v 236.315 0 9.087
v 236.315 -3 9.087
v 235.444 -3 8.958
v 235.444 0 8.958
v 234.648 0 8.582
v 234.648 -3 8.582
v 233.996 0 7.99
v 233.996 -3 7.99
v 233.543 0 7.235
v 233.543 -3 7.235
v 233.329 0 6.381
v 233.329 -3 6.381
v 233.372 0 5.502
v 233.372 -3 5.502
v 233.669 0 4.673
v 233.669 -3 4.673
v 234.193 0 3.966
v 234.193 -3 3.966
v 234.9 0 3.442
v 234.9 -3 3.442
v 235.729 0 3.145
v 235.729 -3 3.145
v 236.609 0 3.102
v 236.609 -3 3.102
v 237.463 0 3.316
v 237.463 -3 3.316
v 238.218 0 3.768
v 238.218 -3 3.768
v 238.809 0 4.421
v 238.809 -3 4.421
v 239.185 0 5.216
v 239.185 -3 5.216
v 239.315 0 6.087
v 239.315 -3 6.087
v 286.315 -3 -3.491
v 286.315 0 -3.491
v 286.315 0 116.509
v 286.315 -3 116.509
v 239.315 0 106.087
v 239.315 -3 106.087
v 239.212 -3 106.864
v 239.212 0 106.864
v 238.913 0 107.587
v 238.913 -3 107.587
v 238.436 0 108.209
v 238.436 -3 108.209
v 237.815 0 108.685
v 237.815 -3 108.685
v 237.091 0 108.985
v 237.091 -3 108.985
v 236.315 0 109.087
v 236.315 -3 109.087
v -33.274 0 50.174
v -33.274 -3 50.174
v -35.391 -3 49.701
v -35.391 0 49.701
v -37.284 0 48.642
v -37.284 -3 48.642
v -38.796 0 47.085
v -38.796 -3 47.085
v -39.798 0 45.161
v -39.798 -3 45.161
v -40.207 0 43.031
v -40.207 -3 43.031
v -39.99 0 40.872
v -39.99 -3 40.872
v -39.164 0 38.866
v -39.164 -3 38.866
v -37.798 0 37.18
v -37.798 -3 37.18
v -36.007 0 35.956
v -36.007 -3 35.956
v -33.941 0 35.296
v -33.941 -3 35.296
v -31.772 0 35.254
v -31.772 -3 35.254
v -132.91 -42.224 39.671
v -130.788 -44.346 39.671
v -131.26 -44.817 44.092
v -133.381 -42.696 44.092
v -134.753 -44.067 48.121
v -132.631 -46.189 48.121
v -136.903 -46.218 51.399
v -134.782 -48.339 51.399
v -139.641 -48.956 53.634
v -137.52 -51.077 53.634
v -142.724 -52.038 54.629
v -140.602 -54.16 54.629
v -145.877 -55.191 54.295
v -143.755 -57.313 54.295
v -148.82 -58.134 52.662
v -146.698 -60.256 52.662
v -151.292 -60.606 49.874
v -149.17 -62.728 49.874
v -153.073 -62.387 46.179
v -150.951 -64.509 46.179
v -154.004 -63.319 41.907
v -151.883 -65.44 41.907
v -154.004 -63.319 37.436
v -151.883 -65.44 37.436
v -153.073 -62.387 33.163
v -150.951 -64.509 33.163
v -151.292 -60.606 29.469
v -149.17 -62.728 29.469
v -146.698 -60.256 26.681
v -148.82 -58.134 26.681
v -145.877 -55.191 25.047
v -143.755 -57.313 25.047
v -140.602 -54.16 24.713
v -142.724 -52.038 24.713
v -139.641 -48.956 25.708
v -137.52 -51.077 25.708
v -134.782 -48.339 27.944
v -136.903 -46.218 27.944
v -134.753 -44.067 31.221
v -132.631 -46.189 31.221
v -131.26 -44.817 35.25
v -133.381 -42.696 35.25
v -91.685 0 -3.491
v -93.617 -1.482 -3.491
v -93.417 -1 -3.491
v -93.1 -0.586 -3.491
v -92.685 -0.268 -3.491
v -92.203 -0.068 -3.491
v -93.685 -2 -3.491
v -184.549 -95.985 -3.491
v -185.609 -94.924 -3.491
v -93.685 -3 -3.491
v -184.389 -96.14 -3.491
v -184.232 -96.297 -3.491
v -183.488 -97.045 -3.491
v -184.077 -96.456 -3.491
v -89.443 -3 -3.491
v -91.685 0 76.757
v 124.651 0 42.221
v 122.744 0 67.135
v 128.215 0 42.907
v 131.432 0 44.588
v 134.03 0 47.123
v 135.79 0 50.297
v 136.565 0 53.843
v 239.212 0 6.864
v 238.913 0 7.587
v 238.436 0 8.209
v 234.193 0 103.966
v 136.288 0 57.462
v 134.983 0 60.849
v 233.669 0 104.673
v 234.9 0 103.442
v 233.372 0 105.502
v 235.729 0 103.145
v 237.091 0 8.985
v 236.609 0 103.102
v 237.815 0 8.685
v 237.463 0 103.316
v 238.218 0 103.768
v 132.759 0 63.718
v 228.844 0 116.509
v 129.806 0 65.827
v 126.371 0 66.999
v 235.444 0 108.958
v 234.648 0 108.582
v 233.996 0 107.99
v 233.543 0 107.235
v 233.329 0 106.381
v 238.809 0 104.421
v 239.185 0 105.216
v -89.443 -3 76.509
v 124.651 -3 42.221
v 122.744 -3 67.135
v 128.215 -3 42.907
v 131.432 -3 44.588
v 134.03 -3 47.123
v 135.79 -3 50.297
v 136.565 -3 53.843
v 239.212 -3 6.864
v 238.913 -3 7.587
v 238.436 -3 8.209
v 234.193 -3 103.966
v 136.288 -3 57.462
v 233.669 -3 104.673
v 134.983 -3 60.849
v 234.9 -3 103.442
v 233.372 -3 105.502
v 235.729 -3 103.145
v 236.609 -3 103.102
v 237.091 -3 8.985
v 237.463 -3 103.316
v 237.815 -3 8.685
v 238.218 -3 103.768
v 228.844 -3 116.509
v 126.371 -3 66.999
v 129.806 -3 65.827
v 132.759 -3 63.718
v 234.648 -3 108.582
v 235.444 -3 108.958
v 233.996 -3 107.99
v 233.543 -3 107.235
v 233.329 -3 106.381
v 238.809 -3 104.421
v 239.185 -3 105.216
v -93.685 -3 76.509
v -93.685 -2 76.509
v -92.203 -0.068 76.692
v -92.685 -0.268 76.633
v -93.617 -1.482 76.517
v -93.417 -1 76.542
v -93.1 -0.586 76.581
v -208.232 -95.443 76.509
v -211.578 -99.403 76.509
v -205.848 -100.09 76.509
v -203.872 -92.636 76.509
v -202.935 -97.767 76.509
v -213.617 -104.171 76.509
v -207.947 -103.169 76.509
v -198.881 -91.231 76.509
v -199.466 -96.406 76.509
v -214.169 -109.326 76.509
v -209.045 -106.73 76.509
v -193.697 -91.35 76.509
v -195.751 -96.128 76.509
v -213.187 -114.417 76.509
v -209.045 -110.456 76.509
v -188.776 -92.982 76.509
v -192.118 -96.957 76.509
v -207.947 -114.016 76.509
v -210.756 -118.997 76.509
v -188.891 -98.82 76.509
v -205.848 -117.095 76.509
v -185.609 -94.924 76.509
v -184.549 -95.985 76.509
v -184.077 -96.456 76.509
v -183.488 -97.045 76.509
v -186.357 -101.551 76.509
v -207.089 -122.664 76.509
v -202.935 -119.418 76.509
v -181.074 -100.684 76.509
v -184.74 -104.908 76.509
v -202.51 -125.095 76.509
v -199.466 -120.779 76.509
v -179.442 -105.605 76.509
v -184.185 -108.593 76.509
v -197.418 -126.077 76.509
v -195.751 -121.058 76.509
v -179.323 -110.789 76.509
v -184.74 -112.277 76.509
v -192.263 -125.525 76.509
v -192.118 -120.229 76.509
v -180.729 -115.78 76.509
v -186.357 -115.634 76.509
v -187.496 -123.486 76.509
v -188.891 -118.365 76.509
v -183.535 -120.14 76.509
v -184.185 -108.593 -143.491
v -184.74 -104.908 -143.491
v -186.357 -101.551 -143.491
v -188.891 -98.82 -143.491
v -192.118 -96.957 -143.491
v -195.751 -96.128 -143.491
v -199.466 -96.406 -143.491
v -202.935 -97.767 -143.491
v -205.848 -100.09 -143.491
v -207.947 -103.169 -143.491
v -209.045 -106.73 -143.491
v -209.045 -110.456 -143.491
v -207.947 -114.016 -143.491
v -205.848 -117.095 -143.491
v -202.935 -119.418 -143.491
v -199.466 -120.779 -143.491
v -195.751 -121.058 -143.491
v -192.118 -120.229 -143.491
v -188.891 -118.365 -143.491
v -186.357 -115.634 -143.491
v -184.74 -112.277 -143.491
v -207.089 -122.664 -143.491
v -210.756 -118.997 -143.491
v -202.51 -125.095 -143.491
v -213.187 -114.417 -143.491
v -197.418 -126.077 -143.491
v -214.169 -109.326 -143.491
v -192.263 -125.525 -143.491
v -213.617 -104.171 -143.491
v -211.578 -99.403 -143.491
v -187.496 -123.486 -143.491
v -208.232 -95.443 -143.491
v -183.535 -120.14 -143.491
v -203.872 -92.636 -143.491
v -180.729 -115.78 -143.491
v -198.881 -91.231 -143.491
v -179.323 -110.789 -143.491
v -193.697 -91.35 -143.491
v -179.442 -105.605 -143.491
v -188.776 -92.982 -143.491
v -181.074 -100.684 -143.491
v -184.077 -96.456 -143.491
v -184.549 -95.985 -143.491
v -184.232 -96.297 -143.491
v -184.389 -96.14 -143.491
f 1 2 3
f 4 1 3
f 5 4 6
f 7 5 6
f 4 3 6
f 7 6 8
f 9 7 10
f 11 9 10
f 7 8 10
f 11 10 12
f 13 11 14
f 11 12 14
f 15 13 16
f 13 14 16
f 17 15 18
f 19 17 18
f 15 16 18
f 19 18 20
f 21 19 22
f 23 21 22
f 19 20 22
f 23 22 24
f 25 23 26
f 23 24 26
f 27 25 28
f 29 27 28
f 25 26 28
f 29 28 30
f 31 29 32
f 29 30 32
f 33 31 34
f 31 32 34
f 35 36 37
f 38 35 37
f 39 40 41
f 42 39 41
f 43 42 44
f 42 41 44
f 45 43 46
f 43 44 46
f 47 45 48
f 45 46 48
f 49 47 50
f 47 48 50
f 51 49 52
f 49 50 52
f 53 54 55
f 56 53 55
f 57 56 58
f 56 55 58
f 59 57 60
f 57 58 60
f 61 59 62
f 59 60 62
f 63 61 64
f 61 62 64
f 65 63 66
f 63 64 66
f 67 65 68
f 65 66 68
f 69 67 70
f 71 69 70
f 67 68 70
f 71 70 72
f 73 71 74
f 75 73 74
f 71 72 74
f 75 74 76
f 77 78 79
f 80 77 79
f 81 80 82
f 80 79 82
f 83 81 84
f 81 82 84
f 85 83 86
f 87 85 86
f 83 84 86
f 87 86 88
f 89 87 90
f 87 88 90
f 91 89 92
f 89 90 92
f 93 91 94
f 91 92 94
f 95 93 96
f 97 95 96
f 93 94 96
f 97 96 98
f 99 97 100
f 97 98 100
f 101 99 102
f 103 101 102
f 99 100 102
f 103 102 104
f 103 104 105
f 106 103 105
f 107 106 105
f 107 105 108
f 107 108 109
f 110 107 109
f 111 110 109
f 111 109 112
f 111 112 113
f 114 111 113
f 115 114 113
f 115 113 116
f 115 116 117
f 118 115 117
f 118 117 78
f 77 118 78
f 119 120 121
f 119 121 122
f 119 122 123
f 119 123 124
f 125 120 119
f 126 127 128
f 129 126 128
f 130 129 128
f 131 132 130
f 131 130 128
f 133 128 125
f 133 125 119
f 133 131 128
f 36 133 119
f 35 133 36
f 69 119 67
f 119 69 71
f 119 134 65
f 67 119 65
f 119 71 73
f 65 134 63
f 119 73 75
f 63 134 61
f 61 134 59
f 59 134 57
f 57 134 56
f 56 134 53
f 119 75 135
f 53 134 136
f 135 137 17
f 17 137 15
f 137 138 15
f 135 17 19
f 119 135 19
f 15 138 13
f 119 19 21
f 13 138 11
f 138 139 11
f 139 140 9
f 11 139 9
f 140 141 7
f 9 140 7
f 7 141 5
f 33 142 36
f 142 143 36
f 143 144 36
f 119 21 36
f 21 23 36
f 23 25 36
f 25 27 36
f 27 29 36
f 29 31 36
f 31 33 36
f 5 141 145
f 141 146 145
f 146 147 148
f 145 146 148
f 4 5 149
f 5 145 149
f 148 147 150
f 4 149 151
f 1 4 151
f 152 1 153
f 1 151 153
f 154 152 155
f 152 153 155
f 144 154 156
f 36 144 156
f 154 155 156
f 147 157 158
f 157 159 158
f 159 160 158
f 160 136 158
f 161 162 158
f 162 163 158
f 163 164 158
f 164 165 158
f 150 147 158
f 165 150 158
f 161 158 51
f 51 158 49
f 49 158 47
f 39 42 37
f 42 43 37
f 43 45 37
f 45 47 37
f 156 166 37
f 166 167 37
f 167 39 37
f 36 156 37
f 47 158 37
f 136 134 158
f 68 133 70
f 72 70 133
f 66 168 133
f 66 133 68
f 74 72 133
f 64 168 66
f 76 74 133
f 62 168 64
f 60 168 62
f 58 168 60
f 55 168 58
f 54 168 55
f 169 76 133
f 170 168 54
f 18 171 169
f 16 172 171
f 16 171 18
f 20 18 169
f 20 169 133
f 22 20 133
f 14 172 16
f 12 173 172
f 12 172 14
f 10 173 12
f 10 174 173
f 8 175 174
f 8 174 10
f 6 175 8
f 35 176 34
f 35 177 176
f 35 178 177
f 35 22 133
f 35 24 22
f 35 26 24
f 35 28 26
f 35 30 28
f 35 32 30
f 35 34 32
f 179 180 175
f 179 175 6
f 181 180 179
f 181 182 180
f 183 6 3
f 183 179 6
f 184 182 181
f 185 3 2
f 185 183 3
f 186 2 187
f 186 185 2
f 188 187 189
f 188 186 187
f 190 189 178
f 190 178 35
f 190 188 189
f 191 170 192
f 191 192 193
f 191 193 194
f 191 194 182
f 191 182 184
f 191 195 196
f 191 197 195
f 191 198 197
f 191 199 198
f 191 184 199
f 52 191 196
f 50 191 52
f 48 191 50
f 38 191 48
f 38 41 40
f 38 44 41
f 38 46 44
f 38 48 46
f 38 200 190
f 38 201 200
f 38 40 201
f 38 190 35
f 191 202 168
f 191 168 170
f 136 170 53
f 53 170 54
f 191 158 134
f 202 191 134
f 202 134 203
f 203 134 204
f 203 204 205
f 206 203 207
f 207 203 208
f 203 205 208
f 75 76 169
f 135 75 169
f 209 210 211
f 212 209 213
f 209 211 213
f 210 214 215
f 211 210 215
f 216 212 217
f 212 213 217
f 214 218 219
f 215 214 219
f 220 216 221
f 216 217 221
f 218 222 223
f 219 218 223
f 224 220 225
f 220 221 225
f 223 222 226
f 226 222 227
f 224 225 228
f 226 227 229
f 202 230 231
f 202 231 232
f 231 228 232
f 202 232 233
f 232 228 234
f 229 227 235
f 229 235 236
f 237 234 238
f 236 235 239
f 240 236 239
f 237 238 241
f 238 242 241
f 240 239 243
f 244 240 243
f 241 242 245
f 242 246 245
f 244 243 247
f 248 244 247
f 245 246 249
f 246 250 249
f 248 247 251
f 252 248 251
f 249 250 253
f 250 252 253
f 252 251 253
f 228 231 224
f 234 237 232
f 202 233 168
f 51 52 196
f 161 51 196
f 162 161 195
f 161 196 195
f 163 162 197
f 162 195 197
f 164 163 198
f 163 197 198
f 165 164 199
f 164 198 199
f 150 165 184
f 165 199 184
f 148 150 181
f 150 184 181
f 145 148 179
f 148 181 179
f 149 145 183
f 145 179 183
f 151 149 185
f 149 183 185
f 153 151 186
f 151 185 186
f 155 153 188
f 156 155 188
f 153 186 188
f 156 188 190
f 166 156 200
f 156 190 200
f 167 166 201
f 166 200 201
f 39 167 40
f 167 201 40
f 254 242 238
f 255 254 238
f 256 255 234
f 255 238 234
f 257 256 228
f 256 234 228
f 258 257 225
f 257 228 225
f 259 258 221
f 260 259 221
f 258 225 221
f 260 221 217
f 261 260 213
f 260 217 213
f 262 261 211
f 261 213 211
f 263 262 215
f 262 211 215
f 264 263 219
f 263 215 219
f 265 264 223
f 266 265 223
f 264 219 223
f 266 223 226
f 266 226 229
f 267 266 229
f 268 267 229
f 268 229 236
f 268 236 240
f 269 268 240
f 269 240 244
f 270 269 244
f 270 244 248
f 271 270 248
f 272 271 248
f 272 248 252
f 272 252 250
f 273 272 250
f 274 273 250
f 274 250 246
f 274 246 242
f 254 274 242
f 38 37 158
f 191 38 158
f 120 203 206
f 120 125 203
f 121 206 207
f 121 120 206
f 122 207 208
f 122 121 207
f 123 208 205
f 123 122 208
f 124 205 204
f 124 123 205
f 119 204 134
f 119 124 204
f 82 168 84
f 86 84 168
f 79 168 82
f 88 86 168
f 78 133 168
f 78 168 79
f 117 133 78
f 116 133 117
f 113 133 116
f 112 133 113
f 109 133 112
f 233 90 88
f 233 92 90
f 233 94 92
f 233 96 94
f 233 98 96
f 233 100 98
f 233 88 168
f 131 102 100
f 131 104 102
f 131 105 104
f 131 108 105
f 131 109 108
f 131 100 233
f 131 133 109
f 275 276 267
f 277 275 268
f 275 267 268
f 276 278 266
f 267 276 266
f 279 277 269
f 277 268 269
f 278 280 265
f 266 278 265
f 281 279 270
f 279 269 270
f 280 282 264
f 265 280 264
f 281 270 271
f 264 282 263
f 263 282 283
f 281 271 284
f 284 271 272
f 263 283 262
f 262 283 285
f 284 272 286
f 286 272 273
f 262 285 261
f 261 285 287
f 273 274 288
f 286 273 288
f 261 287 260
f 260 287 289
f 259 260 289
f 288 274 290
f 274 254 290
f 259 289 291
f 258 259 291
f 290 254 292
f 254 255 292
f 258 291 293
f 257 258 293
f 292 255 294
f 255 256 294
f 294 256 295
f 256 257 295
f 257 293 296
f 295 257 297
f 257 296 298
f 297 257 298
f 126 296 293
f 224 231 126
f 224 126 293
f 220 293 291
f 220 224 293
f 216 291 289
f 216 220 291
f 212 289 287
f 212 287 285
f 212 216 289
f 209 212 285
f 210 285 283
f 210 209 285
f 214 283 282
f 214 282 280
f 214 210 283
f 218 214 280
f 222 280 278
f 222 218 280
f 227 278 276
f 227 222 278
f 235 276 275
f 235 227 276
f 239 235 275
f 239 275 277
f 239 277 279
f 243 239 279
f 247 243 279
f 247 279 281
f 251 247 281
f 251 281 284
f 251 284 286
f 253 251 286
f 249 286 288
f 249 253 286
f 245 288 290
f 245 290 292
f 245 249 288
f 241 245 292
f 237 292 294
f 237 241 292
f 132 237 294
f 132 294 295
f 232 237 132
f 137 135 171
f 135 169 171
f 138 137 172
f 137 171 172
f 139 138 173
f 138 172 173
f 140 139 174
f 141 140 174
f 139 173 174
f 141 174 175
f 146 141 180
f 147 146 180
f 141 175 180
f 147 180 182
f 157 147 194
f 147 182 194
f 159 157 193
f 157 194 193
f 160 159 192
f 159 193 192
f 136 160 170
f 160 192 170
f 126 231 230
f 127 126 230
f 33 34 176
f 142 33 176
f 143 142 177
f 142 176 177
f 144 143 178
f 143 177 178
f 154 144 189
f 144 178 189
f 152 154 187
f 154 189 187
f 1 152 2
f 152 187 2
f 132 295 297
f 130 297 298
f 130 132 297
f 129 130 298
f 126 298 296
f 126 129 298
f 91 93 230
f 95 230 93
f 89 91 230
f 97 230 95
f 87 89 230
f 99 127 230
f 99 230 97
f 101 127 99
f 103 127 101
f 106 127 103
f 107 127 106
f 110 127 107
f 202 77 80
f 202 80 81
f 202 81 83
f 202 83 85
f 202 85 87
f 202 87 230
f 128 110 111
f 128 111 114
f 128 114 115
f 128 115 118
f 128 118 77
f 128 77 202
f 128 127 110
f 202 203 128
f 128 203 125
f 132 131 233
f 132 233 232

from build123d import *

# Parameters (mm, degrees)
F1_DEPTH  = 3
F4_DEPTH  = 80
F5_R      = 2
F6_DEPTH  = 80
F7_R      = 12.5
F8_DEPTH  = 3
F9_R      = 7.5
F10_DEPTH = 3.001
F12_DEPTH = 3
F15_DEPTH = 3.001
F17_DEPTH = 3.001
F18_DEPTH = 80
F13_R     = 15
F19_DEPTH = 70.1223203436
F21_DEPTH = 220
F22_R     = 12.5
F23_DEPTH = 220.001


with BuildPart() as f1:
    # F0 (on Front) → F1 (new body)
    with BuildSketch(Plane.XZ):
        Polygon((-93.6853438616, -3.4913793206), (286.3146561384, -3.4913793206), (286.3146561384, 116.5086206794), (228.8437245958, 116.5086206794), (-93.6853438616, 76.5086206794), align=None)
    extrude(amount=F1_DEPTH)

    # F2 (on face) → F4 (join)
    with BuildSketch(Plane(origin=(0, 0, -3.4913793206), x_dir=(1, 0, 0), z_dir=(0, 0, -1))):
        Polygon((-185.6092254158, 94.9238815543), (-93.6853438616, 3), (-89.4427031745, 3), (-183.4879050723, 97.0452018978), align=None)
    extrude(amount=-F4_DEPTH)

    # F5
    f5_edges = [f1.edges().sort_by_distance(p)[0] for p in [
        (-93.685344, 0, 36.508621),
    ]]
    fillet(f5_edges, radius=F5_R)

    # F7 (on face) → F8 (cut)
    with BuildSketch(Plane.XZ.offset(3)):
        with Locations((124.0946352482, 54.7083429992)):
            Circle(F7_R)
    extrude(amount=-F8_DEPTH, mode=Mode.SUBTRACT)

    # F9 (on face) → F10 (cut, through all)
    with BuildSketch(Plane.XZ.offset(3)):
        with Locations((-32.7149666846, 42.6947064698)):
            Circle(F9_R)
    extrude(amount=-F10_DEPTH, mode=Mode.SUBTRACT)

    # F11 (on face) → F12 (cut)
    with BuildSketch(Plane.XZ.offset(3)):
        with BuildLine():
            ThreePointArc((-25.2149666846, 42.6947064698), (-27.0880889677, 37.736052705), (-31.7718325937, 35.2542429031))
            Line((-31.7718325937, 35.2542429031), (124.6507872105, 42.2207213283))
            ThreePointArc((124.6507872105, 42.2207213283), (111.6310963493, 53.754299962), (122.7436713431, 67.1351244219))
            Line((122.7436713431, 67.1351244219), (-33.2737348604, 50.173862714))
            ThreePointArc((-33.2737348604, 50.173862714), (-27.6130435824, 48.192013143), (-25.2149666846, 42.6947064698))
        make_face()
    extrude(amount=-F12_DEPTH, mode=Mode.SUBTRACT)

    # F14 (on face) → F15 (cut, through all)
    with BuildSketch(Plane.XZ.offset(3)):
        with BuildLine():
            ThreePointArc((239.3146561384, 106.0872673988), (238.435976482, 108.2085877424), (236.3146561384, 109.0872673988))
            ThreePointArc((236.3146561384, 109.0872673988), (234.1933357949, 103.9659470553), (239.3146561384, 106.0872673988))
        make_face()
    extrude(amount=-F15_DEPTH, mode=Mode.SUBTRACT)

    # F16 (on face) → F17 (cut, through all)
    with BuildSketch(Plane.XZ.offset(3)):
        with BuildLine():
            ThreePointArc((239.3146561384, 6.0872673988), (238.435976482, 8.2085877424), (236.3146561384, 9.0872673988))
            ThreePointArc((236.3146561384, 9.0872673988), (234.1933357949, 3.9659470553), (239.3146561384, 6.0872673988))
        make_face()
    extrude(amount=-F17_DEPTH, mode=Mode.SUBTRACT)



with BuildPart() as f6:
    # F3 (on face) → F6 (new body)
    with BuildSketch(Plane(origin=(0, 0, -3.4913793206), x_dir=(1, 0, 0), z_dir=(0, 0, -1))):
        Polygon((-183.4879050723, 97.0452018978), (-185.6092254158, 94.9238815543), (-93.6853438616, 3), (-89.4427031745, 3), align=None)
    extrude(amount=-F6_DEPTH)


with BuildPart() as f1_1:
    add(f1.part)

    add(f6.part)  # F18 merges F6
    # F2 (on face) → F18 (join)
    with BuildSketch(Plane(origin=(0, 0, -3.4913793206), x_dir=(1, 0, 0), z_dir=(0, 0, -1))):
        Polygon((-185.6092254158, 94.9238815543), (-93.6853438616, 3), (-89.4427031745, 3), (-183.4879050723, 97.0452018978), align=None)
    extrude(amount=-F18_DEPTH)

    # F13 (on face) → F19 (cut, through all)
    with BuildSketch(Plane(origin=(-43.2213515872, 43.2213515872, 0), x_dir=(0.7071067812, 0.7071067812, 0), z_dir=(0.7071067812, -0.7071067812, 0))):
        with Locations((-138.838544488, 39.6711453795)):
            Circle(F13_R)
    extrude(amount=-F19_DEPTH, mode=Mode.SUBTRACT)

    # F20 (on face) → F21 (join)
    with BuildSketch(Plane.XY.offset(76.5086206794)):
        with BuildLine():
            Line((-184.5485652441, -95.984541726), (-184.0766972591, -96.456409711))
            ThreePointArc((-184.0766972591, -96.456409711), (-184.3103818476, -96.2182263145), (-184.5485652441, -95.984541726))
        make_face()
        with BuildLine():
            ThreePointArc((-184.5485652441, -95.984541726), (-212.7880613937, -115.4433890159), (-179.1847505183, -108.5925949853))
            ThreePointArc((-179.1847505183, -108.5925949853), (-180.4537472832, -102.0500775813), (-184.0766972591, -96.456409711))
            Line((-184.0766972591, -96.456409711), (-184.5485652441, -95.984541726))
        make_face()
    extrude(amount=-F21_DEPTH)

    # F22 (on face) → F23 (cut, through all)
    with BuildSketch(Plane.XY.offset(76.5086206794)):
        with Locations((-196.6847505183, -108.5925949853)):
            Circle(F22_R)
    extrude(amount=-F23_DEPTH, mode=Mode.SUBTRACT)


with BuildPart() as f24_1:
    # F24: instance of F1
    add(f1_1.part.mirror(Plane.YZ))


solid = f1_1.part
